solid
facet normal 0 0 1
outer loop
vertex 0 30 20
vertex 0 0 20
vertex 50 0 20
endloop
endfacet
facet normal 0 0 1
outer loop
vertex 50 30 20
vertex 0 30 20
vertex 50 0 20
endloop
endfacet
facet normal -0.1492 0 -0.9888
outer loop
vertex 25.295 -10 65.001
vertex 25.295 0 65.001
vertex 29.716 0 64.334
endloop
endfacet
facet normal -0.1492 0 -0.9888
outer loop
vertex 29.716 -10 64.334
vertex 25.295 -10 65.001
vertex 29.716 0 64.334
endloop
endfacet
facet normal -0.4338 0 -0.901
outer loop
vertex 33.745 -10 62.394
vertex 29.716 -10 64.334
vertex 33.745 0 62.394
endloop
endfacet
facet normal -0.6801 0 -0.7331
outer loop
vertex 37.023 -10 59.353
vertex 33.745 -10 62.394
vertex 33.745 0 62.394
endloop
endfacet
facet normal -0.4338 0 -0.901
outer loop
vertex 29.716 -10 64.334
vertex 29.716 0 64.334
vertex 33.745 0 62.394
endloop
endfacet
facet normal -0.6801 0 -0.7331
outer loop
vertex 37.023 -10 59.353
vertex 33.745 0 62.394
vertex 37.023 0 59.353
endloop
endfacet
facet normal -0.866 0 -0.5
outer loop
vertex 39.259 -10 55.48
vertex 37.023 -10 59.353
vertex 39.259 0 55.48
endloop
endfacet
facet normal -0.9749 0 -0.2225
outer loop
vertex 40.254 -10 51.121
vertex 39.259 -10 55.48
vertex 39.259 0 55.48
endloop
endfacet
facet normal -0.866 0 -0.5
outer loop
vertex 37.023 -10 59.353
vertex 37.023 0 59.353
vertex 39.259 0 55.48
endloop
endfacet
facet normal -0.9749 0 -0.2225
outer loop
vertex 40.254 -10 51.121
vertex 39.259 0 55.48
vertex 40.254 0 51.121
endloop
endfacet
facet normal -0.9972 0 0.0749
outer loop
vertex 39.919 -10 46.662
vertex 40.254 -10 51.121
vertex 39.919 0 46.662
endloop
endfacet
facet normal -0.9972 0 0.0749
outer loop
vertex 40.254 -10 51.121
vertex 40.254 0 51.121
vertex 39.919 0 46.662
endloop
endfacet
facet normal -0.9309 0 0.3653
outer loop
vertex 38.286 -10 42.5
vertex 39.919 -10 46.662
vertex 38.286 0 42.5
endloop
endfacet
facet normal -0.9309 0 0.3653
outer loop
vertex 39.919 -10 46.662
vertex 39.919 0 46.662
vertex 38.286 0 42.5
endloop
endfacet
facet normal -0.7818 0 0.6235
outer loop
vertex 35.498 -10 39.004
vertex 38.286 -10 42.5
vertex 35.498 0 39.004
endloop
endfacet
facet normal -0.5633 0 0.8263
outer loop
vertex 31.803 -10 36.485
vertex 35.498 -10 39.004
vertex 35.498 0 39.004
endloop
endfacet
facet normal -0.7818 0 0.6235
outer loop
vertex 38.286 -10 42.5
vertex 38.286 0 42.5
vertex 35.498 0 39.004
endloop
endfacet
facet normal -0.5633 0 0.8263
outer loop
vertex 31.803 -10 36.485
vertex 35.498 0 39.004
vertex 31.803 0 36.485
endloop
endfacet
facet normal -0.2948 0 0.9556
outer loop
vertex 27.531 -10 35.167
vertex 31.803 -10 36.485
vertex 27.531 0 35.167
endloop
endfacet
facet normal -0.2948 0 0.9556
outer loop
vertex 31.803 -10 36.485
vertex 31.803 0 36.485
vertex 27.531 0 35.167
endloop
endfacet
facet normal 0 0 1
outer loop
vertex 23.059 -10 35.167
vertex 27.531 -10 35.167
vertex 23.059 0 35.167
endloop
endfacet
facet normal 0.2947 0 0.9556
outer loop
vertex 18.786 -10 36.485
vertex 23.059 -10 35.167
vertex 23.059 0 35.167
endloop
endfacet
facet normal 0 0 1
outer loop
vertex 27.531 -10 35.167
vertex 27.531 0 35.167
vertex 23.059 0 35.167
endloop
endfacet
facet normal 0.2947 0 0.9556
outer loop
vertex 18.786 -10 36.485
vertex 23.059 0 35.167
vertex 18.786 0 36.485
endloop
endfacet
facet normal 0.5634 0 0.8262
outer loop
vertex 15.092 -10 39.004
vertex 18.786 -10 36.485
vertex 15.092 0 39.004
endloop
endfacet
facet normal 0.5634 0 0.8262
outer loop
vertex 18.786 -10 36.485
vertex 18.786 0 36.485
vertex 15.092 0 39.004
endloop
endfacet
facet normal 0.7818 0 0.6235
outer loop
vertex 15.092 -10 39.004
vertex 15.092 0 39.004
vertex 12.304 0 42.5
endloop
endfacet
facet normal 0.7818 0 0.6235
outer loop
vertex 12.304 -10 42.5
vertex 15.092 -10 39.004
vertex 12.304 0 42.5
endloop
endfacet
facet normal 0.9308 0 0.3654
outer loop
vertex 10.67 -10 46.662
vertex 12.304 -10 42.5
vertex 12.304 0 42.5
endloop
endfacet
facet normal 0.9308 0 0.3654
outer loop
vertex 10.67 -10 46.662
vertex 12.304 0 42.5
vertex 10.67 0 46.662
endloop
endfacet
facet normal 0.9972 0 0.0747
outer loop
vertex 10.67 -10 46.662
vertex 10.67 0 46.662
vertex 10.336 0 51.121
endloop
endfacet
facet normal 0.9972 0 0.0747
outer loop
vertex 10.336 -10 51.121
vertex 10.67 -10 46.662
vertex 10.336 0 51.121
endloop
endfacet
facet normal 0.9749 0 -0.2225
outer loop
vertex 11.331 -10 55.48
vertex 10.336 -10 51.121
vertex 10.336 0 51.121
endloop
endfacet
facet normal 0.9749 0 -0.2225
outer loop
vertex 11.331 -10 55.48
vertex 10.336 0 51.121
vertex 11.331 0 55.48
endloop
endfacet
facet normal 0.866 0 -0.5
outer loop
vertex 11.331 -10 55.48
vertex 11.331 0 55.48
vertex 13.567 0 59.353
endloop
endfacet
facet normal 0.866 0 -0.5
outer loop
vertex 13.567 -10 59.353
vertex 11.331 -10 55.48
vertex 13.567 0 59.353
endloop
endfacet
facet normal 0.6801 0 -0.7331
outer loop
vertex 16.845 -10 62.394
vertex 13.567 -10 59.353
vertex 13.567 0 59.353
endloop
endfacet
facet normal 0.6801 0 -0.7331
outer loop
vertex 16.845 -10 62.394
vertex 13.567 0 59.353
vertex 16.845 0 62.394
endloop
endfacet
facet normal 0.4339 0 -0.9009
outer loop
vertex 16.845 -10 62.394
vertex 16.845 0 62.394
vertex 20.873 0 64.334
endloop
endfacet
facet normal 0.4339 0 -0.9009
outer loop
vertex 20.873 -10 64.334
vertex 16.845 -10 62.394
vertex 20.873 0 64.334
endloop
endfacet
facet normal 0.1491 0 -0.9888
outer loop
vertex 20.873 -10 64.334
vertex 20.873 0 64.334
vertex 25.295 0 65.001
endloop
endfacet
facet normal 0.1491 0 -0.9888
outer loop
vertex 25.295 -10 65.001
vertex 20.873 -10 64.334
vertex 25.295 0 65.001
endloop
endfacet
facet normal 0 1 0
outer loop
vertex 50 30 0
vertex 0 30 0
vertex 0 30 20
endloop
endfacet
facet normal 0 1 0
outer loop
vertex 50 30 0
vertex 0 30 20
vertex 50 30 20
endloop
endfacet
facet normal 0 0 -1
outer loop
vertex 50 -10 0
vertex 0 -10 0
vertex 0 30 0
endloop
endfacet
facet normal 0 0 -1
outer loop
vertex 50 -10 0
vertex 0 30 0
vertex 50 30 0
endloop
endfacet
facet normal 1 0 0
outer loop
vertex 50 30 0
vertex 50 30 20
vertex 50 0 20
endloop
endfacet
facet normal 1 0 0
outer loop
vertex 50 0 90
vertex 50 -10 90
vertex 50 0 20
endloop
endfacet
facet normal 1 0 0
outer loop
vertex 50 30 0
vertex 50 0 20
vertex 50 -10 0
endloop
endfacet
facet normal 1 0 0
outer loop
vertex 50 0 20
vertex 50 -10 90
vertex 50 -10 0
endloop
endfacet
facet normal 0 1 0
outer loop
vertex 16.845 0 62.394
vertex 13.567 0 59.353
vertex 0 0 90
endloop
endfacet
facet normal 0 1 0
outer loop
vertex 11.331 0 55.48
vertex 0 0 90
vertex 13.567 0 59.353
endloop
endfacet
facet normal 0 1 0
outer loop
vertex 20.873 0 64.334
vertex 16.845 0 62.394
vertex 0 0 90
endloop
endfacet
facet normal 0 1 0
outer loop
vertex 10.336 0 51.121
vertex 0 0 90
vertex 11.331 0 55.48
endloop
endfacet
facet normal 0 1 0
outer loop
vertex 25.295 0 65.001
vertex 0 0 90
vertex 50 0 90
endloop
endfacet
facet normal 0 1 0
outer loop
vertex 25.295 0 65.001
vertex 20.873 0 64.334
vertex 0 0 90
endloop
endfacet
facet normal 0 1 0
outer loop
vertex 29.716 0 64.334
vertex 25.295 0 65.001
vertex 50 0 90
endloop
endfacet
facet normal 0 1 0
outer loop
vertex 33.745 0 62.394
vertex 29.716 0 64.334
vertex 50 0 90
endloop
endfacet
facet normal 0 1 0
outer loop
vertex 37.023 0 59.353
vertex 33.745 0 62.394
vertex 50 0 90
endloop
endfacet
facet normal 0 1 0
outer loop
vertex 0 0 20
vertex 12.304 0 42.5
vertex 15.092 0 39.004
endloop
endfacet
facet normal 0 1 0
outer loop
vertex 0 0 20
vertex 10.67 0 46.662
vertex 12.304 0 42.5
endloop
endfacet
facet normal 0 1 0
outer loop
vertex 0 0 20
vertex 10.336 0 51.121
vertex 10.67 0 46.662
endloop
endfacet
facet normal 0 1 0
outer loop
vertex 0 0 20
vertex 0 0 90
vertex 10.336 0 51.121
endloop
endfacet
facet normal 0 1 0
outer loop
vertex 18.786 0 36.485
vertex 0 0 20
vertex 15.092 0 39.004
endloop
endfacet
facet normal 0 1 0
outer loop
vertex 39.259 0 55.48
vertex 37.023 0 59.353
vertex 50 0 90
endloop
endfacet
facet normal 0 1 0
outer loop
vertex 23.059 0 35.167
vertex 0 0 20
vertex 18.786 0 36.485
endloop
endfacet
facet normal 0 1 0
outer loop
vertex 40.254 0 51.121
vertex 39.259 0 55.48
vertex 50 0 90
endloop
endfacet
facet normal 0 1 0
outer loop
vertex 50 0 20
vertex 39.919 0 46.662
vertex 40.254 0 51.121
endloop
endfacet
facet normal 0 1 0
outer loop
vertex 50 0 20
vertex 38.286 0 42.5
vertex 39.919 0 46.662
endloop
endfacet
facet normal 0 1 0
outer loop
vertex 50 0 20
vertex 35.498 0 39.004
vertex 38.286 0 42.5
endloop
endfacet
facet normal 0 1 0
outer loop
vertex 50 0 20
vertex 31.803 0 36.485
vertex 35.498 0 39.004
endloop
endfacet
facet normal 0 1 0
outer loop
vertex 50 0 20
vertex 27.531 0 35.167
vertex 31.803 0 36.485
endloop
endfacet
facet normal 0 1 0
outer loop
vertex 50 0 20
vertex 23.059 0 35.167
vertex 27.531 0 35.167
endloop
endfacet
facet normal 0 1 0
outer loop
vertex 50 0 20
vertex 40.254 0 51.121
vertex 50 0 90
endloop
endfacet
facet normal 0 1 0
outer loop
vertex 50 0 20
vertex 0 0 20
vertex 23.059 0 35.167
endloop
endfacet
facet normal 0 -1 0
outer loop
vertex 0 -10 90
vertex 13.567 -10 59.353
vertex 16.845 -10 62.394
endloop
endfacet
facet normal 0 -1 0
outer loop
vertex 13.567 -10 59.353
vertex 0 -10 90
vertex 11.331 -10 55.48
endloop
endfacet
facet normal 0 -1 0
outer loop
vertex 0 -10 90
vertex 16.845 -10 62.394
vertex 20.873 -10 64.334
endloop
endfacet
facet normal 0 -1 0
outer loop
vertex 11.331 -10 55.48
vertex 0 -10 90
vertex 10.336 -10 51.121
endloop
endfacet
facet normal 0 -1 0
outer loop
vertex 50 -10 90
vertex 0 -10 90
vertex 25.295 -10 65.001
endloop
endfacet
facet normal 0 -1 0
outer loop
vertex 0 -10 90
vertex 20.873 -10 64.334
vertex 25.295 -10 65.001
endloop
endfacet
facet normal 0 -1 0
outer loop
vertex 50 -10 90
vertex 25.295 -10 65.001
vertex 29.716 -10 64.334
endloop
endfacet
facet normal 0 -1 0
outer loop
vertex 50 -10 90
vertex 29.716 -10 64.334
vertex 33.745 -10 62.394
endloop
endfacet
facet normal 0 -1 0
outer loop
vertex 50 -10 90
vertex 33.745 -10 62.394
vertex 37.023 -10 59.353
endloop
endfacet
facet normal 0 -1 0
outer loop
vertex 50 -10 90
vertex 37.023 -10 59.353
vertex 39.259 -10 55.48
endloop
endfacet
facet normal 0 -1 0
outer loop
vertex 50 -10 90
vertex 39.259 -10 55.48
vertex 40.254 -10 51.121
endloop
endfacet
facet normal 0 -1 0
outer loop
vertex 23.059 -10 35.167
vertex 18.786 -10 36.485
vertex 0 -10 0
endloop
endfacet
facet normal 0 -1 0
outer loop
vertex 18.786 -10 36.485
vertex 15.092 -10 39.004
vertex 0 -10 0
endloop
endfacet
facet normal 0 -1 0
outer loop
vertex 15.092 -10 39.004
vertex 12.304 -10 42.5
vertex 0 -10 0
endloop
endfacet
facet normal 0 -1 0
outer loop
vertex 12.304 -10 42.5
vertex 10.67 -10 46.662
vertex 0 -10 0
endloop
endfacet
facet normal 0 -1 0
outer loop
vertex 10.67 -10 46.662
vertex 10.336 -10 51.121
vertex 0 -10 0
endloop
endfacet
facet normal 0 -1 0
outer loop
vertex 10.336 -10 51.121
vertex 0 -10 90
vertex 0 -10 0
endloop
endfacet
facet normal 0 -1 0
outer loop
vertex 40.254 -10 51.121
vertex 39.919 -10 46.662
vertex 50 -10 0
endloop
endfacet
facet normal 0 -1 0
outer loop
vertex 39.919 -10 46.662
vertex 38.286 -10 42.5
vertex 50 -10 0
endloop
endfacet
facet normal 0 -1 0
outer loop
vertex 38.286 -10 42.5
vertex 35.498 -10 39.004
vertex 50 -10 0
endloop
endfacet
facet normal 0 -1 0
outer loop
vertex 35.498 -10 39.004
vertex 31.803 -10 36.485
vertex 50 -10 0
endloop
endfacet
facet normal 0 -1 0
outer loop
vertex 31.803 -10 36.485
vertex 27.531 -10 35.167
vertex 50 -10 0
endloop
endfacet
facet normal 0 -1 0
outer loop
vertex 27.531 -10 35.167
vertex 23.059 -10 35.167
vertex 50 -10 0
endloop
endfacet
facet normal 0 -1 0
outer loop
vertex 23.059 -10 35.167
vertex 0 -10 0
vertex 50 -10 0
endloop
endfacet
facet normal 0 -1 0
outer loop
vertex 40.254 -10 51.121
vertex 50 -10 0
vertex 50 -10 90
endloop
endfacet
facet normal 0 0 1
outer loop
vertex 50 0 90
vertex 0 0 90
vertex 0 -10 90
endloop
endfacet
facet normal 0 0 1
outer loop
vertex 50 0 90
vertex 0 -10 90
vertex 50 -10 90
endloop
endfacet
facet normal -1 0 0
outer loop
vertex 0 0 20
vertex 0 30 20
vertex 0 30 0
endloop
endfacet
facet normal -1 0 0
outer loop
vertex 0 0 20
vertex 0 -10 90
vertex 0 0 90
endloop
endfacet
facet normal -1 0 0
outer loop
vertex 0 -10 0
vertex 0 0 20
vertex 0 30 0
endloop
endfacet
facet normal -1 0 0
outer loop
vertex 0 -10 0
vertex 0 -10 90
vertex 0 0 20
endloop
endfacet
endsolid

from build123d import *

# Parameters (mm, degrees)
SKETCH1_W           = 50
SKETCH1_H           = 10
BOSS_EXTRUDE1_DEPTH = 90
SKETCH2_W           = 50
SKETCH2_H           = 20
BOSS_EXTRUDE2_DEPTH = 30
SKETCH3_R           = 15.0006
CUT_EXTRUDE1_DEPTH  = 108.238052948


with BuildPart() as part:
    # Sketch1 → Boss-Extrude1 (new body)
    with BuildSketch(Plane.XY):
        with Locations((25, -5)):
            Rectangle(SKETCH1_W, SKETCH1_H)
    extrude(amount=BOSS_EXTRUDE1_DEPTH)

    # Sketch2 → Boss-Extrude2 (add)
    with BuildSketch(Plane(origin=(0, 0, 0), x_dir=(1, 0, 0), z_dir=(0, 1, 0))):
        with Locations((25, -10)):
            Rectangle(SKETCH2_W, SKETCH2_H)
    extrude(amount=BOSS_EXTRUDE2_DEPTH)

    # Sketch3 → Cut-Extrude1 (cut, through all)
    with BuildSketch(Plane(origin=(0, 0, 0), x_dir=(1, 0, 0), z_dir=(0, 1, 0))):
        with Locations(Location((25.294928994, -50, 0), (0, 0, 270))):
            Circle(SKETCH3_R)
    extrude(amount=-CUT_EXTRUDE1_DEPTH, mode=Mode.SUBTRACT)


solid = part.part
